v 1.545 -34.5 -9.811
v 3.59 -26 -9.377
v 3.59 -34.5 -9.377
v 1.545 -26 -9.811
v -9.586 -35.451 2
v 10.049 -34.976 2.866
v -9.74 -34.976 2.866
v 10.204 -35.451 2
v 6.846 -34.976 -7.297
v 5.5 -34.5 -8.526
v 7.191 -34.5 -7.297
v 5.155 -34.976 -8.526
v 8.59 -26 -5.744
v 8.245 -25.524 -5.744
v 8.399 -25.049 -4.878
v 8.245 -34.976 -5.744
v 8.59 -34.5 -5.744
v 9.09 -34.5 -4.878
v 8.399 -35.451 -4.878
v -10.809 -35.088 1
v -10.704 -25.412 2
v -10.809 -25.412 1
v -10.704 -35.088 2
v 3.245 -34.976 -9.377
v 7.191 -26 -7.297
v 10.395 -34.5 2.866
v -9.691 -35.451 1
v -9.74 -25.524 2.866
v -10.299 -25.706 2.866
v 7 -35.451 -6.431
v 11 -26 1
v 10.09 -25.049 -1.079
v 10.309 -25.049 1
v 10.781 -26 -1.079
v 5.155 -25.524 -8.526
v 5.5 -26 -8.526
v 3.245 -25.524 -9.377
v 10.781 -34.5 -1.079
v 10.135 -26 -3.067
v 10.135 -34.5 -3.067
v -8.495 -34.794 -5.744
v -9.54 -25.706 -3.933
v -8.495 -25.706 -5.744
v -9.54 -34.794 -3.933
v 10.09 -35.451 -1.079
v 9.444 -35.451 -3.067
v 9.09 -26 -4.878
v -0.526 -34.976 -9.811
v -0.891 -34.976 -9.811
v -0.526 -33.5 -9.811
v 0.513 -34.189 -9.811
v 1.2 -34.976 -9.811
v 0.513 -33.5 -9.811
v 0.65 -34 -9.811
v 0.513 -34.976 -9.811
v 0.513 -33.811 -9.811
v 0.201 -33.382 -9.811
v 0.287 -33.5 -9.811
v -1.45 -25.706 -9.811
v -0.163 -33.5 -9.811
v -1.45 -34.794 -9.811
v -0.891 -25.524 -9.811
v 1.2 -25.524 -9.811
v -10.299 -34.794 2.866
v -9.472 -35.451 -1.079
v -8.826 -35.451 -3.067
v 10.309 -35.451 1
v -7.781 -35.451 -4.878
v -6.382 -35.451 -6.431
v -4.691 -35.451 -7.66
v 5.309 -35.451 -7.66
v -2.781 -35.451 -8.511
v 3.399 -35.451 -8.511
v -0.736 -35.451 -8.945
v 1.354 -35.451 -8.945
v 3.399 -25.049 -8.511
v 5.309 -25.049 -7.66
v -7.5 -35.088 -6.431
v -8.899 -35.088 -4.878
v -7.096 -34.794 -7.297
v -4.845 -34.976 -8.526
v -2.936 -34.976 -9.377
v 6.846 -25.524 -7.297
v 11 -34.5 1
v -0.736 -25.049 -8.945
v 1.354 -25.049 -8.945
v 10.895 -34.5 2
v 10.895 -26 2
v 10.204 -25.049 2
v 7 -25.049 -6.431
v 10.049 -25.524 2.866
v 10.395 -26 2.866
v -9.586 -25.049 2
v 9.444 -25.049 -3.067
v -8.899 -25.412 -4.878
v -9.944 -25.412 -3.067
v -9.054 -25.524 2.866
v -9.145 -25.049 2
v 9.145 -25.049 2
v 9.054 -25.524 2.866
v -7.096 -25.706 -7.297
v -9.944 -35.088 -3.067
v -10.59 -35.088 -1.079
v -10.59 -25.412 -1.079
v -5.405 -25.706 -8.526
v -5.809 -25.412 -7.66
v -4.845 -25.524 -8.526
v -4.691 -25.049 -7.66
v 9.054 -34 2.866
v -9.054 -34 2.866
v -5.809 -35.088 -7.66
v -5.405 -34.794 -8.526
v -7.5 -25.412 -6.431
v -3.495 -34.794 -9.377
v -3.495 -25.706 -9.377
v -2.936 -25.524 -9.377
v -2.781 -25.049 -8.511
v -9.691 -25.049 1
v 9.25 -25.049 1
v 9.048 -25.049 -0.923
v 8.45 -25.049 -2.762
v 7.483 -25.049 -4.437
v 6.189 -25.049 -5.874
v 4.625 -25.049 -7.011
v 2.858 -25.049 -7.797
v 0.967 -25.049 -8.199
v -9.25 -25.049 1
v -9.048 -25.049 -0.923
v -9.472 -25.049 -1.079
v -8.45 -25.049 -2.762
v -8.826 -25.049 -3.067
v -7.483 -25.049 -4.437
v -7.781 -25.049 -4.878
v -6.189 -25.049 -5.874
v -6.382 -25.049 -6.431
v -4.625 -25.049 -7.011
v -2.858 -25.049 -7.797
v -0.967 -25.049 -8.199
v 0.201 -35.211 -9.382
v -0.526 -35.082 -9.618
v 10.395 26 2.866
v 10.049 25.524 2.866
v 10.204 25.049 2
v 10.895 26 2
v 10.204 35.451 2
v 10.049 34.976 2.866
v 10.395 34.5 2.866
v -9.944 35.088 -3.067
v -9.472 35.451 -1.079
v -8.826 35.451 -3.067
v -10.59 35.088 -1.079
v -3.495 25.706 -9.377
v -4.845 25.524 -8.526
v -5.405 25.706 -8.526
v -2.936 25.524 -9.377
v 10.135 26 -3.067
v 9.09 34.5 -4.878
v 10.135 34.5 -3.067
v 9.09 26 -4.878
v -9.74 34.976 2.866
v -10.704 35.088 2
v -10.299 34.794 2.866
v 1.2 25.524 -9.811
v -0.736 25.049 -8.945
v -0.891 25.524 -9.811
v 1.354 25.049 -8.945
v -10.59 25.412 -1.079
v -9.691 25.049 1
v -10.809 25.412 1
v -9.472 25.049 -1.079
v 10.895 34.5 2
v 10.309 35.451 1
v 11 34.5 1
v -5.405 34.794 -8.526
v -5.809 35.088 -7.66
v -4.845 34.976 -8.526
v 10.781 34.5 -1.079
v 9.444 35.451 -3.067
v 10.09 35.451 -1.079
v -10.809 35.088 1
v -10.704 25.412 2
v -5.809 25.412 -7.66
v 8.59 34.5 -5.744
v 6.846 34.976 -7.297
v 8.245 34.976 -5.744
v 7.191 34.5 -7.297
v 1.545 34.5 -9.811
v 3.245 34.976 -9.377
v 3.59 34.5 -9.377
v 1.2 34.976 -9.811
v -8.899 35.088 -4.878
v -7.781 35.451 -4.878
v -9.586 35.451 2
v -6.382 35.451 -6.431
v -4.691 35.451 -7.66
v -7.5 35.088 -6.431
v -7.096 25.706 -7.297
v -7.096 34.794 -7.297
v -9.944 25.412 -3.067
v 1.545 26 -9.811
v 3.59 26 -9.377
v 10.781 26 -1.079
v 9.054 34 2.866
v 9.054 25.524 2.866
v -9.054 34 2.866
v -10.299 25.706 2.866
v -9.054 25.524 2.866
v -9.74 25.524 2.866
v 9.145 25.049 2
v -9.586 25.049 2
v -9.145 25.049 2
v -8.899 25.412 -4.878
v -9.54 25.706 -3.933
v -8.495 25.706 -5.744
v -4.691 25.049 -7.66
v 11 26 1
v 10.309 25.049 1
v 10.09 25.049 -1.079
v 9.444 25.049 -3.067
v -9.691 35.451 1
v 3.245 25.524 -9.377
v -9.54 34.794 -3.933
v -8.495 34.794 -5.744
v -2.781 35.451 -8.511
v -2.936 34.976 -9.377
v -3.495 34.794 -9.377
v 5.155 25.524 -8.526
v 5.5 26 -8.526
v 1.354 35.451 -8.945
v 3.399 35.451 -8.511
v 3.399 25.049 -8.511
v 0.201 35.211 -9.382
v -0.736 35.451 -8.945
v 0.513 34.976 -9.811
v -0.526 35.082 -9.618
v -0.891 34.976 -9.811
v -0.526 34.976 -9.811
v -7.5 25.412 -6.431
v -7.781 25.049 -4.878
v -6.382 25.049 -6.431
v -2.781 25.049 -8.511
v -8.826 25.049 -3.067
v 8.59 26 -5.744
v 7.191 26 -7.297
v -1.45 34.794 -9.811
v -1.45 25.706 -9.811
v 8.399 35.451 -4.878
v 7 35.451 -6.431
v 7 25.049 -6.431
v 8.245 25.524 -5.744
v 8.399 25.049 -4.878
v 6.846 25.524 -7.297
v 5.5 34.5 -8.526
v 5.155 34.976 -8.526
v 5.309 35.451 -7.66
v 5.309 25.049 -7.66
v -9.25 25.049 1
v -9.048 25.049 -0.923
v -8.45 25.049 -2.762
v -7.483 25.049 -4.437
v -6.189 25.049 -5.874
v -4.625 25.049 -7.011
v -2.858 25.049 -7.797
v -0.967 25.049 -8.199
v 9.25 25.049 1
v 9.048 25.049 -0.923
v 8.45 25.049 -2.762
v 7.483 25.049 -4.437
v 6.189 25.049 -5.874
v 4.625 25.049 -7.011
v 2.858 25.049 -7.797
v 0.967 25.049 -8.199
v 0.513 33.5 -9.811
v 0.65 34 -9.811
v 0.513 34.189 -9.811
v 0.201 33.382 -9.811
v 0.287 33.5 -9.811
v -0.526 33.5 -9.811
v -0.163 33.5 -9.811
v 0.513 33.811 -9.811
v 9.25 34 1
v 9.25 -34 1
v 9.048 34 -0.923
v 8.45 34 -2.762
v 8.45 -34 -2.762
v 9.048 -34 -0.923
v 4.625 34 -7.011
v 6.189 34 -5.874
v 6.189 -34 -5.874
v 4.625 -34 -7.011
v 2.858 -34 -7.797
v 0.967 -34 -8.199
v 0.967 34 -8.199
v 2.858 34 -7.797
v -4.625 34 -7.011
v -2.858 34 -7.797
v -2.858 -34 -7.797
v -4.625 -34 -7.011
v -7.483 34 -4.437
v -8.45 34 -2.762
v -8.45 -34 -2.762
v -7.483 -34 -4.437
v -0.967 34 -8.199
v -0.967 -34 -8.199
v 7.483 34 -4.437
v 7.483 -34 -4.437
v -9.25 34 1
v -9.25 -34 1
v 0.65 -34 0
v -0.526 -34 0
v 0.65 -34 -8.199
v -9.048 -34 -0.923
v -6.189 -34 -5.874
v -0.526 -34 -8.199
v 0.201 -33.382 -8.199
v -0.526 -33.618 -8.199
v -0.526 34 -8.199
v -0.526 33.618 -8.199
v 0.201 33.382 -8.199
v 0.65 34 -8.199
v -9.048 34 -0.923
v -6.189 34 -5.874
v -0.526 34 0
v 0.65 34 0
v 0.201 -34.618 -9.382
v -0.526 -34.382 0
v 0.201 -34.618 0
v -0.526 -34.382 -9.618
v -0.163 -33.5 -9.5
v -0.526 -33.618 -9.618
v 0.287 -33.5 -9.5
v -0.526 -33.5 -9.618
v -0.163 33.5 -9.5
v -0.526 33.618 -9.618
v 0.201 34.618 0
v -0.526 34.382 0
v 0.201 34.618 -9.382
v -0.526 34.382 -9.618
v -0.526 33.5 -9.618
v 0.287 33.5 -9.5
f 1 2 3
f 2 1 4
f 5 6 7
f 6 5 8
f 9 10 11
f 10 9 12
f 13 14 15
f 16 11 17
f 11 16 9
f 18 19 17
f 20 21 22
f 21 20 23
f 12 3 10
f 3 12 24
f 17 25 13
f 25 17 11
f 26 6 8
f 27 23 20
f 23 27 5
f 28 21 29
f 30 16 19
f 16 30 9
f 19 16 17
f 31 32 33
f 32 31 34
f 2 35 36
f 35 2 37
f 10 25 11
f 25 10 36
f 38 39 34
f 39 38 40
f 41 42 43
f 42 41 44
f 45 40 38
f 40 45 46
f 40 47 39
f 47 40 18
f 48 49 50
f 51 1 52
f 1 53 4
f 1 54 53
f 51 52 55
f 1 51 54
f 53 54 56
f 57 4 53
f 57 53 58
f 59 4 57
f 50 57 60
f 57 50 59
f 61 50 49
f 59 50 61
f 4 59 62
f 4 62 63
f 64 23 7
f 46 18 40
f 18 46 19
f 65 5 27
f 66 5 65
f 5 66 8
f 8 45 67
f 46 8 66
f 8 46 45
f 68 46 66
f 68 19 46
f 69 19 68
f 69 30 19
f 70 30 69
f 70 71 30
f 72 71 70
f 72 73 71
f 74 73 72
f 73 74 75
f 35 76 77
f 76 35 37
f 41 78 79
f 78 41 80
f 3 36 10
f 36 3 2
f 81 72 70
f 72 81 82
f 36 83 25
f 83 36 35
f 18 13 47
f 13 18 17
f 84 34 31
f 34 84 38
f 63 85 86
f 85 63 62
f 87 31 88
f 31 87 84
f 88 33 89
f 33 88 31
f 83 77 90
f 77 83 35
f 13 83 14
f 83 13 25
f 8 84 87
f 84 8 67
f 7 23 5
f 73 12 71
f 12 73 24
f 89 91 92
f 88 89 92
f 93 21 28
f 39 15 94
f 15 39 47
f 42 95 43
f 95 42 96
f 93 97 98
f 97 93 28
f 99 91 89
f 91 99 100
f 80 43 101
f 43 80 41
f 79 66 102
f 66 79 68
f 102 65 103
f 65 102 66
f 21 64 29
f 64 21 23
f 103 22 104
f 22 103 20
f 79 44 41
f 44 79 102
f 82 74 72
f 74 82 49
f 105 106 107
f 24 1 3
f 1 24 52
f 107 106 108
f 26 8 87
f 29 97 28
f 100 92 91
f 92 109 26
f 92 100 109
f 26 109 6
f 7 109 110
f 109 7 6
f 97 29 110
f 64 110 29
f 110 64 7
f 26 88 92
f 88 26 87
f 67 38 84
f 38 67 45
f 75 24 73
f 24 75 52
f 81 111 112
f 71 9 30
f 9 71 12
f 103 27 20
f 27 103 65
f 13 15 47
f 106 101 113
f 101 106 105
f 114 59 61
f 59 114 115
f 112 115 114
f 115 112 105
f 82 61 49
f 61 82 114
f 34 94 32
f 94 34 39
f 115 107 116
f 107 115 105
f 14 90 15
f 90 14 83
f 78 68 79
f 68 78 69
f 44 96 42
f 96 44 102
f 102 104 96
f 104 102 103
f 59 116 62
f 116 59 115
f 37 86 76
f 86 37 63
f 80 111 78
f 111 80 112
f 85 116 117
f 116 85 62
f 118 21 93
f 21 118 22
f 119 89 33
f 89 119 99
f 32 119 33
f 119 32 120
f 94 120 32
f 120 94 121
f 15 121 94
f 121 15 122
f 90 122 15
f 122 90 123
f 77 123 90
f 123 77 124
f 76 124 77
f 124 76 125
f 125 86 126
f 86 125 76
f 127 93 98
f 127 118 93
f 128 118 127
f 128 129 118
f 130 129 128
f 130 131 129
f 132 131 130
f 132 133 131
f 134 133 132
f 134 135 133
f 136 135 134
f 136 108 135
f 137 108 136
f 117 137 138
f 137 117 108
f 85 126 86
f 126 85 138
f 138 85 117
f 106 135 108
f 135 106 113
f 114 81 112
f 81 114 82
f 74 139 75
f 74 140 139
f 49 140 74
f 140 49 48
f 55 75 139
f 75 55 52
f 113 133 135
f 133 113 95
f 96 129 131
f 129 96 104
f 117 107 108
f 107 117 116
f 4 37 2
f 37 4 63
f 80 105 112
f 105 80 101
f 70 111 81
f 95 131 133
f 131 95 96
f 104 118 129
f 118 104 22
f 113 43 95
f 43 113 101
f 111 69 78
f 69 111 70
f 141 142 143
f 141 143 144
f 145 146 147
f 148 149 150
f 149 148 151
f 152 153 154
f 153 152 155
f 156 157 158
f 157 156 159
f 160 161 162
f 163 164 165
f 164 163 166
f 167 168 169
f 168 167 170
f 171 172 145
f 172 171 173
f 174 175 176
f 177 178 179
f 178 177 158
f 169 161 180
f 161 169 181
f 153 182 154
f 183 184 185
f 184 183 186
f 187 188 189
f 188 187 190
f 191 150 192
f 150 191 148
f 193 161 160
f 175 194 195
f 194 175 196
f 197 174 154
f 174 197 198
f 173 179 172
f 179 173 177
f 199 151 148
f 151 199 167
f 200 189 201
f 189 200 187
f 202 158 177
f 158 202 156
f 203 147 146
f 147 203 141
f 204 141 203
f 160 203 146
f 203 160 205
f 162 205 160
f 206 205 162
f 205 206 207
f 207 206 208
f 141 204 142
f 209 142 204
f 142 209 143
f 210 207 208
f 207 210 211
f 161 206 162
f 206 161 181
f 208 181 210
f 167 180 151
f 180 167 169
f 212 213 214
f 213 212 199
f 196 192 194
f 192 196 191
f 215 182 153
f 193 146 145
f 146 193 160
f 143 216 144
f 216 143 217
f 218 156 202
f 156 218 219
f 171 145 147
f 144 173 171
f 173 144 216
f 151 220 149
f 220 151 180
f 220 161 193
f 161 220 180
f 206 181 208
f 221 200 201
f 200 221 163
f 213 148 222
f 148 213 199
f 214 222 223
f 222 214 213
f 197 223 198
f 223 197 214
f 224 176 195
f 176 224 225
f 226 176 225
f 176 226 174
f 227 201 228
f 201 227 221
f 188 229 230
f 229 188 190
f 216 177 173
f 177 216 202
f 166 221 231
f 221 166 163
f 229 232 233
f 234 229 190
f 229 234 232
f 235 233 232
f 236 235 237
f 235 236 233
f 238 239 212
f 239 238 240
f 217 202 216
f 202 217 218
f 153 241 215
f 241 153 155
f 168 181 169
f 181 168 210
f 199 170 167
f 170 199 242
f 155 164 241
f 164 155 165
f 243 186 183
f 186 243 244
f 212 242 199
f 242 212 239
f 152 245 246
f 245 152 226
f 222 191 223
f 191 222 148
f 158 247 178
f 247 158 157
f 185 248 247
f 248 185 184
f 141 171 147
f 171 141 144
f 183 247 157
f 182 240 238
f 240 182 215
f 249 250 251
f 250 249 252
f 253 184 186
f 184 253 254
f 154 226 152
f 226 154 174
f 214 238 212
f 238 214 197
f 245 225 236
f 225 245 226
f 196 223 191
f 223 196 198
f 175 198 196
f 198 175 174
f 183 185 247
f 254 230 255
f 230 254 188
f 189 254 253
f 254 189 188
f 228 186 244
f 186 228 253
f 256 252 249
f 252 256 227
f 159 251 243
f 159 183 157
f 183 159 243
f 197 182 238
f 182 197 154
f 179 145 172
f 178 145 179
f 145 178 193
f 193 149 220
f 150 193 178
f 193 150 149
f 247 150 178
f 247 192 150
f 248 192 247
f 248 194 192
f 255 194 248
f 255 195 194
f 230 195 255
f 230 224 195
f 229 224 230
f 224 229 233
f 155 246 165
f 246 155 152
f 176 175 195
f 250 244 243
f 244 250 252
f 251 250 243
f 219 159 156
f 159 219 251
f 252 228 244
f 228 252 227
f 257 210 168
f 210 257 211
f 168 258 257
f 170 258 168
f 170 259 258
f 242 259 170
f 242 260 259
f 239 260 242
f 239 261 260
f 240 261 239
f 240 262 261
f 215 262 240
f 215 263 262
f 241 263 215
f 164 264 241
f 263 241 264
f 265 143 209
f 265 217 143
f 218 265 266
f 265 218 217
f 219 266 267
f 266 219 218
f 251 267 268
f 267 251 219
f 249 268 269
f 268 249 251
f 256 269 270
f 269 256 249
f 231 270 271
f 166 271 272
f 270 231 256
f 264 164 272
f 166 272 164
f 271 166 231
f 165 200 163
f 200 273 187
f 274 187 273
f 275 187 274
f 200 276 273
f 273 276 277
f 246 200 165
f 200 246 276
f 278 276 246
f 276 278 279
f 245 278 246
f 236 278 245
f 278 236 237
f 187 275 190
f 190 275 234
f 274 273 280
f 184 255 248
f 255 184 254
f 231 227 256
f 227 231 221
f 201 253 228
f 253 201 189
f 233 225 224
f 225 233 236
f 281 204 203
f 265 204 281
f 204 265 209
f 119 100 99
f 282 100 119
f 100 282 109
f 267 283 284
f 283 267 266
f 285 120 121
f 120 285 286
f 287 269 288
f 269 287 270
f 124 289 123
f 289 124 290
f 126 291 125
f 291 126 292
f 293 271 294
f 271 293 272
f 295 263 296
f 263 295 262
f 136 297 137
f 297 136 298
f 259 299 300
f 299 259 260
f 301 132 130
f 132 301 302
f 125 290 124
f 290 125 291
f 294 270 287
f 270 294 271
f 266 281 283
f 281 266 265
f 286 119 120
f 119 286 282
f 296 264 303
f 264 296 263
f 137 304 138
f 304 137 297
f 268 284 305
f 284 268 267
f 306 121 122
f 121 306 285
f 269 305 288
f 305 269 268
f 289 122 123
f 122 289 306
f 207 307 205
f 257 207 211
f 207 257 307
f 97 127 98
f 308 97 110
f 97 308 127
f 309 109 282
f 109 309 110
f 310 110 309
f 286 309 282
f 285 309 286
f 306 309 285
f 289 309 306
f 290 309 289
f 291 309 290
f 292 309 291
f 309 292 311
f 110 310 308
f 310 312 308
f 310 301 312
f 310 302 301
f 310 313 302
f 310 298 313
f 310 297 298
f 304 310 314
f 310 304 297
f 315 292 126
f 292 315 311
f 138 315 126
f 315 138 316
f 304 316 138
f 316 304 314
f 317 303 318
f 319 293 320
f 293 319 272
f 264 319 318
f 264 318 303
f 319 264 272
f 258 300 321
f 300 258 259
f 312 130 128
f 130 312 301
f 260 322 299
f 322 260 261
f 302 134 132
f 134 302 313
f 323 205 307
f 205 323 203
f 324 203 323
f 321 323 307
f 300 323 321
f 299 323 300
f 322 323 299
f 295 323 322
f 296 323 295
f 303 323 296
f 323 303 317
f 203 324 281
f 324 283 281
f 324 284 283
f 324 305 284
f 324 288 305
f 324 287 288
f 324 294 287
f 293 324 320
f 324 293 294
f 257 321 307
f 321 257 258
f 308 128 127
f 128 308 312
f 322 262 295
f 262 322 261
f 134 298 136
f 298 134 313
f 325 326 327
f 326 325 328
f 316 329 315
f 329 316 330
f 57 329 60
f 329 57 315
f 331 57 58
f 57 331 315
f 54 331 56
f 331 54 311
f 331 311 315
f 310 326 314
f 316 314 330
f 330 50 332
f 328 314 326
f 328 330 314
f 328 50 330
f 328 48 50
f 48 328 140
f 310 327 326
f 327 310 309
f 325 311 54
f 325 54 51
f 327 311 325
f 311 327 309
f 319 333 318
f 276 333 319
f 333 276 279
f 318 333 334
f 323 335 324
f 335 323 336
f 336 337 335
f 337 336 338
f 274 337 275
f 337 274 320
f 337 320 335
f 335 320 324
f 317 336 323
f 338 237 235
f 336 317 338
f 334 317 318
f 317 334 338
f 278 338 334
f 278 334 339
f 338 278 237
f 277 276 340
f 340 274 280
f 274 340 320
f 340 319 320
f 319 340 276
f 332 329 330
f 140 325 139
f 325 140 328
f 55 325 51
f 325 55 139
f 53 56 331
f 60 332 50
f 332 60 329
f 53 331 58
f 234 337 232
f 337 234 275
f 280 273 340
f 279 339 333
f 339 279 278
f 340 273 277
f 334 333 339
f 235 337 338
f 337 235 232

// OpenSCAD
//Soporte para utilizar dos pilas 18650 en el SMARS
//por Manuel Miranda Melián 2018
//use <use/openscad/Shapes.scad>
//$fn=50;
//battery_holders();
battery_holder_single();
/*
union() {
  difference() {
    //caja principal
    translate([0,0,1])
    minkowski() {
      cube([66.5,72,5.1],center=true);
      sphere(r=1,center=true);
    }
    //muesca soporte
    translate([0,0,-2.5])
    cube([59,69,5.1],center=true);
    //apertura superior
    translate([0,0,1.5])
    cube([53,66,7.1],center=true);
    //recorte trasero
    translate([0,-33.1,1])
    cube([50,8,7.1],center=true);  
    //conector spi
    translate([-1,31,1])
    cube([8,6,7.1],center=true);
    //muesca portabaterias
    translate([33.5,0,-1])
    cube([1.5,32,1.5],center=true);
    translate([-33.5,0,-1])
    cube([1.5,32,1.5],center=true);
    //soportes portabaterias
    translate([31.5,29,1])
    cube([2.2,8.5,7.1],center=true);
    translate([-31.5,29,1])
    cube([2.2,8.5,7.1],center=true);
    translate([31.5,-29,1])
    cube([2.2,8.5,7.1],center=true);
    translate([-31.5,-29,1])
    cube([2.2,8.5,7.1],center=true);
  }
  
}*/
/*
//soportes centrales
translate([29,0,-6])
difference() {
  cube([4,6,12],center=true);
  translate([-1,0,-5])
  cube([2.6,6.1,2.1],center=true);
}

translate([-29,0,-6])
difference() {
  cube([4,6,12],center=true);
  translate([1,0,-5])
  cube([2.6,6.1,2.1],center=true);
}

//enlaces patas arduino
translate([27,-19.75,2.3])
cube([6,4,4.4],center=true);

translate([-26,-18.5,2.3])
cube([6,4,4.4],center=true);

*/
//portabaterias


module battery_holder_single(){



    portabaterias();
    
 
/*
translate([-60,0,7])
mirror([1,0,0])
portabaterias();*/

}


module triangles(){
    
  /*
    color("blue")
    translate([-5,-30,-10])
    rotate([90,90,0])

    Right_Angled_Triangle(
   17,17, height=9, 
    center=true);*/
    
}
module portabaterias() {
  translate([0,0,1])
  difference() {
    union() {
      minkowski() {      
        difference() {
          rotate([90,0,0])
          cylinder(d=20,h=69,center=true);
          translate([0,0,10.5])
          cube([20,70,19],center=true);
          translate([10,0,4.5])
          cube([100,52,41],center=true);
        }
        sphere(r=1,center=true);
      }
      
      //muesca inferior
     /* translate([-5,0,-8.5])
      cube([10,30,5],center=true);
      translate([-10.5,0,-10.5])
      cube([2,30,1],center=true);*/
    triangles();
      translate([0,60,0])
    triangles();
  }
    

    rotate([90,0,0])
    cylinder(d=18.5,h=68,center=true);
    //contactos
    translate([0,-34,-6])
    cylinder(d=1.3,h=10,center=true);
    translate([0,34,-6])
    cylinder(d=1.3,h=10,center=true);
    translate([0,-38.5,-11])
    rotate([90,0,0])
    cylinder(d=1.3,h=10,center=true);
    translate([0,38.5,-11])
    rotate([90,0,0])
    cylinder(d=1.3,h=10,center=true);

  }
   
    
    

  //soportes
 /* translate([-13,29,-7])
  soporte_portapila();
  translate([-13,-29,-7])
  soporte_portapila();*/
}

module soporte_portapila() {
  difference() {
    translate([0,0,1])
    cube([1.5,7,4],center=true);
    translate([1.7,0,-1.1])
    rotate([0,-60,0])
    cube([1.6,7.1,3.1],center=true);
  }
  translate([1.75,0,3])
  cube([5,7,1.5],center=true);
  translate([0,0,4])
  cube([1,3,2],center=true);
  translate([0.5,0,5.5])
  rotate([0,30,0])
  cube([1,3,2],center=true);

}
